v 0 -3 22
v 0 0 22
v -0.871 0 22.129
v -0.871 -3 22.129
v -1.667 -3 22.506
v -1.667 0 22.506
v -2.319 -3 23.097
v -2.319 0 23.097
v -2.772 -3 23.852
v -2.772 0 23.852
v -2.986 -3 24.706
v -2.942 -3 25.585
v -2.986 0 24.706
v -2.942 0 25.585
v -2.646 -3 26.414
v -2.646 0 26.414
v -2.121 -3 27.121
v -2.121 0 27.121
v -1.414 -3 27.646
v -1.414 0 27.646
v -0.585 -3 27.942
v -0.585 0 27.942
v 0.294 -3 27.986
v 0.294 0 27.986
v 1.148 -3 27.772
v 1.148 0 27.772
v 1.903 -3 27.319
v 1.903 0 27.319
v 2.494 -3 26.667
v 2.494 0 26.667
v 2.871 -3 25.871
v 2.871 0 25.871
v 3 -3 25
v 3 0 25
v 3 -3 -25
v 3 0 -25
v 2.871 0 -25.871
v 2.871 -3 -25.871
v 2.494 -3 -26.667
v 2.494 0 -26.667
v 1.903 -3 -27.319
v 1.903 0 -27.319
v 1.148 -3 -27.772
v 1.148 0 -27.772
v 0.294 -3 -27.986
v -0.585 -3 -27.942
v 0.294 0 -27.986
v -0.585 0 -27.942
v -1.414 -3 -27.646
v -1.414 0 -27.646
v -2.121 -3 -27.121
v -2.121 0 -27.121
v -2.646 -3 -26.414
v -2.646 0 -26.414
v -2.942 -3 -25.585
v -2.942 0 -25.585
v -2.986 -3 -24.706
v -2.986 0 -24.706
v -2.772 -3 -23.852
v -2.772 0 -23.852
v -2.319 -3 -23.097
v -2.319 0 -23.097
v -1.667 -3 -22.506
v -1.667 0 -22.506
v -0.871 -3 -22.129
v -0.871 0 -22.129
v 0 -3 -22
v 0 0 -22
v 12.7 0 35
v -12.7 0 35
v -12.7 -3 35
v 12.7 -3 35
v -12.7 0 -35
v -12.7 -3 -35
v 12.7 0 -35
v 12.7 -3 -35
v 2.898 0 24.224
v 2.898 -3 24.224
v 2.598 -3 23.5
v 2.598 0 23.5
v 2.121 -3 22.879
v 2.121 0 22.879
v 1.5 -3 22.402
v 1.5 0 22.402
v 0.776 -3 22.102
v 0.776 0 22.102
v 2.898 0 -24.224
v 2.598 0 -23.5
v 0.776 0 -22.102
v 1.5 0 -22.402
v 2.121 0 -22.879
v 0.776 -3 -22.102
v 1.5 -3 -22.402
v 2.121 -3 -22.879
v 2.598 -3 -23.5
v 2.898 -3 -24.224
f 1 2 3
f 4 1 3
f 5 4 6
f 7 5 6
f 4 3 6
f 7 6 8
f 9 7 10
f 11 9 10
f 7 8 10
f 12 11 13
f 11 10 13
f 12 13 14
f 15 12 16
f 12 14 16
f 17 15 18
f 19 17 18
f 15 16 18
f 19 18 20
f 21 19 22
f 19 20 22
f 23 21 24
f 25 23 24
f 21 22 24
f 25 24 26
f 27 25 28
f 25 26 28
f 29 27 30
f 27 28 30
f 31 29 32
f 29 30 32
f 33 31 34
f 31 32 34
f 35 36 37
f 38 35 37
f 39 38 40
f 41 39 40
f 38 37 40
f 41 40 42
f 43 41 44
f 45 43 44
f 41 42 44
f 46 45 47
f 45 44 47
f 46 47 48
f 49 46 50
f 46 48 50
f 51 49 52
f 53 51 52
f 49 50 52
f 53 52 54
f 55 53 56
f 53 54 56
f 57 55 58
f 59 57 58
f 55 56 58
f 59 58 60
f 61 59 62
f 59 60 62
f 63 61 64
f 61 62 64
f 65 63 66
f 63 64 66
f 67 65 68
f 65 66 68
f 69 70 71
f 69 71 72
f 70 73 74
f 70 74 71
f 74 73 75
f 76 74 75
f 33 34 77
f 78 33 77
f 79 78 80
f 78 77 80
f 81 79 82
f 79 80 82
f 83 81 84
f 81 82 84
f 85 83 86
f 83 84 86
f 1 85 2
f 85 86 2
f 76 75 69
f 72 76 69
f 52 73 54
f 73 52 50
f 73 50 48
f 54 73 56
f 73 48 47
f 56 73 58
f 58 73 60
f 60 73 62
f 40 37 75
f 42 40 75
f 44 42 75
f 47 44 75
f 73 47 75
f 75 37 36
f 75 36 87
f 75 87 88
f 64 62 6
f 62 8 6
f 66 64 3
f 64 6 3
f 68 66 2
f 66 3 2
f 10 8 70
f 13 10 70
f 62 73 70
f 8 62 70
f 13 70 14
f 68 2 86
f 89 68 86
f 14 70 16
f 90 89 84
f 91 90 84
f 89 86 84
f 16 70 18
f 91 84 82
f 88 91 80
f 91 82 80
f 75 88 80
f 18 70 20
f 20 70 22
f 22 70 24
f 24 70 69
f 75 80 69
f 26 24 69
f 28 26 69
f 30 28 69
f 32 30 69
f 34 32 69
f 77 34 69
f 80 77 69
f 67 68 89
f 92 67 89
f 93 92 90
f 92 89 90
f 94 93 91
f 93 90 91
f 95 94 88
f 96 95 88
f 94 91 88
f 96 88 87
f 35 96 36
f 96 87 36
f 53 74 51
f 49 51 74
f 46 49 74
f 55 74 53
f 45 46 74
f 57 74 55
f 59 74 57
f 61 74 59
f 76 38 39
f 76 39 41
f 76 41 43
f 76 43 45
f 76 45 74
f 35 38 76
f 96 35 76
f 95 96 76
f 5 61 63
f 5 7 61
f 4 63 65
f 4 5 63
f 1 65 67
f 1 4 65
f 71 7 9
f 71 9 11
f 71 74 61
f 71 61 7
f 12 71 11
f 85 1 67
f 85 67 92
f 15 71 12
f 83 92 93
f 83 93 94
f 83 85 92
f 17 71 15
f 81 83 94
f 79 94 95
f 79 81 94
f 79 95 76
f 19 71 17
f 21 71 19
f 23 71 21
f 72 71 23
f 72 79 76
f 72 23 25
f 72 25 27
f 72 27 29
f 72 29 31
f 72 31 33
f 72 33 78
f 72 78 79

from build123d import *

# Parameters (mm, degrees)
F0_W     = 25.4
F0_H     = 70
F1_DEPTH = 3


with BuildPart() as f1:
    # F0 (on Front) → F1 (new body)
    with BuildSketch(Plane.XZ):
        Rectangle(F0_W, F0_H)
        with BuildLine():
            ThreePointArc((3, -25), (-2.12132, -27.12132), (0, -22))
            ThreePointArc((0, -22), (2.12132, -22.87868), (3, -25))
        make_face(mode=Mode.SUBTRACT)
        with BuildLine():
            ThreePointArc((3, 25), (2.12132, 22.87868), (0, 22))
            ThreePointArc((0, 22), (-2.12132, 27.12132), (3, 25))
        make_face(mode=Mode.SUBTRACT)
    extrude(amount=F1_DEPTH)


solid = f1.part
